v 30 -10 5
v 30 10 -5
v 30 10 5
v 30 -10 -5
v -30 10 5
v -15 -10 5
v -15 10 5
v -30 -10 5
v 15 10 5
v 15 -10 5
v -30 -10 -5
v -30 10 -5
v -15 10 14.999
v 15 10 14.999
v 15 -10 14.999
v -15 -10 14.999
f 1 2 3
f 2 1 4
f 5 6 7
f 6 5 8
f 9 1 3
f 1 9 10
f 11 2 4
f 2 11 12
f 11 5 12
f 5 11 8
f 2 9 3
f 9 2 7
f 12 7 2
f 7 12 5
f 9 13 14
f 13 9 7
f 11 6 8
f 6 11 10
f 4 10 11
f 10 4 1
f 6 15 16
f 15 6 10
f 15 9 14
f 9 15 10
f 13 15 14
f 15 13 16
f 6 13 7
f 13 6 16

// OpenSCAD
// (width,depth,height)
// a small overlap 
// of about 0.001 - 0.002
cube([60,20,10],center=true);
translate([0, 0, 9.999])
    cube([30,20,10],center=true);
